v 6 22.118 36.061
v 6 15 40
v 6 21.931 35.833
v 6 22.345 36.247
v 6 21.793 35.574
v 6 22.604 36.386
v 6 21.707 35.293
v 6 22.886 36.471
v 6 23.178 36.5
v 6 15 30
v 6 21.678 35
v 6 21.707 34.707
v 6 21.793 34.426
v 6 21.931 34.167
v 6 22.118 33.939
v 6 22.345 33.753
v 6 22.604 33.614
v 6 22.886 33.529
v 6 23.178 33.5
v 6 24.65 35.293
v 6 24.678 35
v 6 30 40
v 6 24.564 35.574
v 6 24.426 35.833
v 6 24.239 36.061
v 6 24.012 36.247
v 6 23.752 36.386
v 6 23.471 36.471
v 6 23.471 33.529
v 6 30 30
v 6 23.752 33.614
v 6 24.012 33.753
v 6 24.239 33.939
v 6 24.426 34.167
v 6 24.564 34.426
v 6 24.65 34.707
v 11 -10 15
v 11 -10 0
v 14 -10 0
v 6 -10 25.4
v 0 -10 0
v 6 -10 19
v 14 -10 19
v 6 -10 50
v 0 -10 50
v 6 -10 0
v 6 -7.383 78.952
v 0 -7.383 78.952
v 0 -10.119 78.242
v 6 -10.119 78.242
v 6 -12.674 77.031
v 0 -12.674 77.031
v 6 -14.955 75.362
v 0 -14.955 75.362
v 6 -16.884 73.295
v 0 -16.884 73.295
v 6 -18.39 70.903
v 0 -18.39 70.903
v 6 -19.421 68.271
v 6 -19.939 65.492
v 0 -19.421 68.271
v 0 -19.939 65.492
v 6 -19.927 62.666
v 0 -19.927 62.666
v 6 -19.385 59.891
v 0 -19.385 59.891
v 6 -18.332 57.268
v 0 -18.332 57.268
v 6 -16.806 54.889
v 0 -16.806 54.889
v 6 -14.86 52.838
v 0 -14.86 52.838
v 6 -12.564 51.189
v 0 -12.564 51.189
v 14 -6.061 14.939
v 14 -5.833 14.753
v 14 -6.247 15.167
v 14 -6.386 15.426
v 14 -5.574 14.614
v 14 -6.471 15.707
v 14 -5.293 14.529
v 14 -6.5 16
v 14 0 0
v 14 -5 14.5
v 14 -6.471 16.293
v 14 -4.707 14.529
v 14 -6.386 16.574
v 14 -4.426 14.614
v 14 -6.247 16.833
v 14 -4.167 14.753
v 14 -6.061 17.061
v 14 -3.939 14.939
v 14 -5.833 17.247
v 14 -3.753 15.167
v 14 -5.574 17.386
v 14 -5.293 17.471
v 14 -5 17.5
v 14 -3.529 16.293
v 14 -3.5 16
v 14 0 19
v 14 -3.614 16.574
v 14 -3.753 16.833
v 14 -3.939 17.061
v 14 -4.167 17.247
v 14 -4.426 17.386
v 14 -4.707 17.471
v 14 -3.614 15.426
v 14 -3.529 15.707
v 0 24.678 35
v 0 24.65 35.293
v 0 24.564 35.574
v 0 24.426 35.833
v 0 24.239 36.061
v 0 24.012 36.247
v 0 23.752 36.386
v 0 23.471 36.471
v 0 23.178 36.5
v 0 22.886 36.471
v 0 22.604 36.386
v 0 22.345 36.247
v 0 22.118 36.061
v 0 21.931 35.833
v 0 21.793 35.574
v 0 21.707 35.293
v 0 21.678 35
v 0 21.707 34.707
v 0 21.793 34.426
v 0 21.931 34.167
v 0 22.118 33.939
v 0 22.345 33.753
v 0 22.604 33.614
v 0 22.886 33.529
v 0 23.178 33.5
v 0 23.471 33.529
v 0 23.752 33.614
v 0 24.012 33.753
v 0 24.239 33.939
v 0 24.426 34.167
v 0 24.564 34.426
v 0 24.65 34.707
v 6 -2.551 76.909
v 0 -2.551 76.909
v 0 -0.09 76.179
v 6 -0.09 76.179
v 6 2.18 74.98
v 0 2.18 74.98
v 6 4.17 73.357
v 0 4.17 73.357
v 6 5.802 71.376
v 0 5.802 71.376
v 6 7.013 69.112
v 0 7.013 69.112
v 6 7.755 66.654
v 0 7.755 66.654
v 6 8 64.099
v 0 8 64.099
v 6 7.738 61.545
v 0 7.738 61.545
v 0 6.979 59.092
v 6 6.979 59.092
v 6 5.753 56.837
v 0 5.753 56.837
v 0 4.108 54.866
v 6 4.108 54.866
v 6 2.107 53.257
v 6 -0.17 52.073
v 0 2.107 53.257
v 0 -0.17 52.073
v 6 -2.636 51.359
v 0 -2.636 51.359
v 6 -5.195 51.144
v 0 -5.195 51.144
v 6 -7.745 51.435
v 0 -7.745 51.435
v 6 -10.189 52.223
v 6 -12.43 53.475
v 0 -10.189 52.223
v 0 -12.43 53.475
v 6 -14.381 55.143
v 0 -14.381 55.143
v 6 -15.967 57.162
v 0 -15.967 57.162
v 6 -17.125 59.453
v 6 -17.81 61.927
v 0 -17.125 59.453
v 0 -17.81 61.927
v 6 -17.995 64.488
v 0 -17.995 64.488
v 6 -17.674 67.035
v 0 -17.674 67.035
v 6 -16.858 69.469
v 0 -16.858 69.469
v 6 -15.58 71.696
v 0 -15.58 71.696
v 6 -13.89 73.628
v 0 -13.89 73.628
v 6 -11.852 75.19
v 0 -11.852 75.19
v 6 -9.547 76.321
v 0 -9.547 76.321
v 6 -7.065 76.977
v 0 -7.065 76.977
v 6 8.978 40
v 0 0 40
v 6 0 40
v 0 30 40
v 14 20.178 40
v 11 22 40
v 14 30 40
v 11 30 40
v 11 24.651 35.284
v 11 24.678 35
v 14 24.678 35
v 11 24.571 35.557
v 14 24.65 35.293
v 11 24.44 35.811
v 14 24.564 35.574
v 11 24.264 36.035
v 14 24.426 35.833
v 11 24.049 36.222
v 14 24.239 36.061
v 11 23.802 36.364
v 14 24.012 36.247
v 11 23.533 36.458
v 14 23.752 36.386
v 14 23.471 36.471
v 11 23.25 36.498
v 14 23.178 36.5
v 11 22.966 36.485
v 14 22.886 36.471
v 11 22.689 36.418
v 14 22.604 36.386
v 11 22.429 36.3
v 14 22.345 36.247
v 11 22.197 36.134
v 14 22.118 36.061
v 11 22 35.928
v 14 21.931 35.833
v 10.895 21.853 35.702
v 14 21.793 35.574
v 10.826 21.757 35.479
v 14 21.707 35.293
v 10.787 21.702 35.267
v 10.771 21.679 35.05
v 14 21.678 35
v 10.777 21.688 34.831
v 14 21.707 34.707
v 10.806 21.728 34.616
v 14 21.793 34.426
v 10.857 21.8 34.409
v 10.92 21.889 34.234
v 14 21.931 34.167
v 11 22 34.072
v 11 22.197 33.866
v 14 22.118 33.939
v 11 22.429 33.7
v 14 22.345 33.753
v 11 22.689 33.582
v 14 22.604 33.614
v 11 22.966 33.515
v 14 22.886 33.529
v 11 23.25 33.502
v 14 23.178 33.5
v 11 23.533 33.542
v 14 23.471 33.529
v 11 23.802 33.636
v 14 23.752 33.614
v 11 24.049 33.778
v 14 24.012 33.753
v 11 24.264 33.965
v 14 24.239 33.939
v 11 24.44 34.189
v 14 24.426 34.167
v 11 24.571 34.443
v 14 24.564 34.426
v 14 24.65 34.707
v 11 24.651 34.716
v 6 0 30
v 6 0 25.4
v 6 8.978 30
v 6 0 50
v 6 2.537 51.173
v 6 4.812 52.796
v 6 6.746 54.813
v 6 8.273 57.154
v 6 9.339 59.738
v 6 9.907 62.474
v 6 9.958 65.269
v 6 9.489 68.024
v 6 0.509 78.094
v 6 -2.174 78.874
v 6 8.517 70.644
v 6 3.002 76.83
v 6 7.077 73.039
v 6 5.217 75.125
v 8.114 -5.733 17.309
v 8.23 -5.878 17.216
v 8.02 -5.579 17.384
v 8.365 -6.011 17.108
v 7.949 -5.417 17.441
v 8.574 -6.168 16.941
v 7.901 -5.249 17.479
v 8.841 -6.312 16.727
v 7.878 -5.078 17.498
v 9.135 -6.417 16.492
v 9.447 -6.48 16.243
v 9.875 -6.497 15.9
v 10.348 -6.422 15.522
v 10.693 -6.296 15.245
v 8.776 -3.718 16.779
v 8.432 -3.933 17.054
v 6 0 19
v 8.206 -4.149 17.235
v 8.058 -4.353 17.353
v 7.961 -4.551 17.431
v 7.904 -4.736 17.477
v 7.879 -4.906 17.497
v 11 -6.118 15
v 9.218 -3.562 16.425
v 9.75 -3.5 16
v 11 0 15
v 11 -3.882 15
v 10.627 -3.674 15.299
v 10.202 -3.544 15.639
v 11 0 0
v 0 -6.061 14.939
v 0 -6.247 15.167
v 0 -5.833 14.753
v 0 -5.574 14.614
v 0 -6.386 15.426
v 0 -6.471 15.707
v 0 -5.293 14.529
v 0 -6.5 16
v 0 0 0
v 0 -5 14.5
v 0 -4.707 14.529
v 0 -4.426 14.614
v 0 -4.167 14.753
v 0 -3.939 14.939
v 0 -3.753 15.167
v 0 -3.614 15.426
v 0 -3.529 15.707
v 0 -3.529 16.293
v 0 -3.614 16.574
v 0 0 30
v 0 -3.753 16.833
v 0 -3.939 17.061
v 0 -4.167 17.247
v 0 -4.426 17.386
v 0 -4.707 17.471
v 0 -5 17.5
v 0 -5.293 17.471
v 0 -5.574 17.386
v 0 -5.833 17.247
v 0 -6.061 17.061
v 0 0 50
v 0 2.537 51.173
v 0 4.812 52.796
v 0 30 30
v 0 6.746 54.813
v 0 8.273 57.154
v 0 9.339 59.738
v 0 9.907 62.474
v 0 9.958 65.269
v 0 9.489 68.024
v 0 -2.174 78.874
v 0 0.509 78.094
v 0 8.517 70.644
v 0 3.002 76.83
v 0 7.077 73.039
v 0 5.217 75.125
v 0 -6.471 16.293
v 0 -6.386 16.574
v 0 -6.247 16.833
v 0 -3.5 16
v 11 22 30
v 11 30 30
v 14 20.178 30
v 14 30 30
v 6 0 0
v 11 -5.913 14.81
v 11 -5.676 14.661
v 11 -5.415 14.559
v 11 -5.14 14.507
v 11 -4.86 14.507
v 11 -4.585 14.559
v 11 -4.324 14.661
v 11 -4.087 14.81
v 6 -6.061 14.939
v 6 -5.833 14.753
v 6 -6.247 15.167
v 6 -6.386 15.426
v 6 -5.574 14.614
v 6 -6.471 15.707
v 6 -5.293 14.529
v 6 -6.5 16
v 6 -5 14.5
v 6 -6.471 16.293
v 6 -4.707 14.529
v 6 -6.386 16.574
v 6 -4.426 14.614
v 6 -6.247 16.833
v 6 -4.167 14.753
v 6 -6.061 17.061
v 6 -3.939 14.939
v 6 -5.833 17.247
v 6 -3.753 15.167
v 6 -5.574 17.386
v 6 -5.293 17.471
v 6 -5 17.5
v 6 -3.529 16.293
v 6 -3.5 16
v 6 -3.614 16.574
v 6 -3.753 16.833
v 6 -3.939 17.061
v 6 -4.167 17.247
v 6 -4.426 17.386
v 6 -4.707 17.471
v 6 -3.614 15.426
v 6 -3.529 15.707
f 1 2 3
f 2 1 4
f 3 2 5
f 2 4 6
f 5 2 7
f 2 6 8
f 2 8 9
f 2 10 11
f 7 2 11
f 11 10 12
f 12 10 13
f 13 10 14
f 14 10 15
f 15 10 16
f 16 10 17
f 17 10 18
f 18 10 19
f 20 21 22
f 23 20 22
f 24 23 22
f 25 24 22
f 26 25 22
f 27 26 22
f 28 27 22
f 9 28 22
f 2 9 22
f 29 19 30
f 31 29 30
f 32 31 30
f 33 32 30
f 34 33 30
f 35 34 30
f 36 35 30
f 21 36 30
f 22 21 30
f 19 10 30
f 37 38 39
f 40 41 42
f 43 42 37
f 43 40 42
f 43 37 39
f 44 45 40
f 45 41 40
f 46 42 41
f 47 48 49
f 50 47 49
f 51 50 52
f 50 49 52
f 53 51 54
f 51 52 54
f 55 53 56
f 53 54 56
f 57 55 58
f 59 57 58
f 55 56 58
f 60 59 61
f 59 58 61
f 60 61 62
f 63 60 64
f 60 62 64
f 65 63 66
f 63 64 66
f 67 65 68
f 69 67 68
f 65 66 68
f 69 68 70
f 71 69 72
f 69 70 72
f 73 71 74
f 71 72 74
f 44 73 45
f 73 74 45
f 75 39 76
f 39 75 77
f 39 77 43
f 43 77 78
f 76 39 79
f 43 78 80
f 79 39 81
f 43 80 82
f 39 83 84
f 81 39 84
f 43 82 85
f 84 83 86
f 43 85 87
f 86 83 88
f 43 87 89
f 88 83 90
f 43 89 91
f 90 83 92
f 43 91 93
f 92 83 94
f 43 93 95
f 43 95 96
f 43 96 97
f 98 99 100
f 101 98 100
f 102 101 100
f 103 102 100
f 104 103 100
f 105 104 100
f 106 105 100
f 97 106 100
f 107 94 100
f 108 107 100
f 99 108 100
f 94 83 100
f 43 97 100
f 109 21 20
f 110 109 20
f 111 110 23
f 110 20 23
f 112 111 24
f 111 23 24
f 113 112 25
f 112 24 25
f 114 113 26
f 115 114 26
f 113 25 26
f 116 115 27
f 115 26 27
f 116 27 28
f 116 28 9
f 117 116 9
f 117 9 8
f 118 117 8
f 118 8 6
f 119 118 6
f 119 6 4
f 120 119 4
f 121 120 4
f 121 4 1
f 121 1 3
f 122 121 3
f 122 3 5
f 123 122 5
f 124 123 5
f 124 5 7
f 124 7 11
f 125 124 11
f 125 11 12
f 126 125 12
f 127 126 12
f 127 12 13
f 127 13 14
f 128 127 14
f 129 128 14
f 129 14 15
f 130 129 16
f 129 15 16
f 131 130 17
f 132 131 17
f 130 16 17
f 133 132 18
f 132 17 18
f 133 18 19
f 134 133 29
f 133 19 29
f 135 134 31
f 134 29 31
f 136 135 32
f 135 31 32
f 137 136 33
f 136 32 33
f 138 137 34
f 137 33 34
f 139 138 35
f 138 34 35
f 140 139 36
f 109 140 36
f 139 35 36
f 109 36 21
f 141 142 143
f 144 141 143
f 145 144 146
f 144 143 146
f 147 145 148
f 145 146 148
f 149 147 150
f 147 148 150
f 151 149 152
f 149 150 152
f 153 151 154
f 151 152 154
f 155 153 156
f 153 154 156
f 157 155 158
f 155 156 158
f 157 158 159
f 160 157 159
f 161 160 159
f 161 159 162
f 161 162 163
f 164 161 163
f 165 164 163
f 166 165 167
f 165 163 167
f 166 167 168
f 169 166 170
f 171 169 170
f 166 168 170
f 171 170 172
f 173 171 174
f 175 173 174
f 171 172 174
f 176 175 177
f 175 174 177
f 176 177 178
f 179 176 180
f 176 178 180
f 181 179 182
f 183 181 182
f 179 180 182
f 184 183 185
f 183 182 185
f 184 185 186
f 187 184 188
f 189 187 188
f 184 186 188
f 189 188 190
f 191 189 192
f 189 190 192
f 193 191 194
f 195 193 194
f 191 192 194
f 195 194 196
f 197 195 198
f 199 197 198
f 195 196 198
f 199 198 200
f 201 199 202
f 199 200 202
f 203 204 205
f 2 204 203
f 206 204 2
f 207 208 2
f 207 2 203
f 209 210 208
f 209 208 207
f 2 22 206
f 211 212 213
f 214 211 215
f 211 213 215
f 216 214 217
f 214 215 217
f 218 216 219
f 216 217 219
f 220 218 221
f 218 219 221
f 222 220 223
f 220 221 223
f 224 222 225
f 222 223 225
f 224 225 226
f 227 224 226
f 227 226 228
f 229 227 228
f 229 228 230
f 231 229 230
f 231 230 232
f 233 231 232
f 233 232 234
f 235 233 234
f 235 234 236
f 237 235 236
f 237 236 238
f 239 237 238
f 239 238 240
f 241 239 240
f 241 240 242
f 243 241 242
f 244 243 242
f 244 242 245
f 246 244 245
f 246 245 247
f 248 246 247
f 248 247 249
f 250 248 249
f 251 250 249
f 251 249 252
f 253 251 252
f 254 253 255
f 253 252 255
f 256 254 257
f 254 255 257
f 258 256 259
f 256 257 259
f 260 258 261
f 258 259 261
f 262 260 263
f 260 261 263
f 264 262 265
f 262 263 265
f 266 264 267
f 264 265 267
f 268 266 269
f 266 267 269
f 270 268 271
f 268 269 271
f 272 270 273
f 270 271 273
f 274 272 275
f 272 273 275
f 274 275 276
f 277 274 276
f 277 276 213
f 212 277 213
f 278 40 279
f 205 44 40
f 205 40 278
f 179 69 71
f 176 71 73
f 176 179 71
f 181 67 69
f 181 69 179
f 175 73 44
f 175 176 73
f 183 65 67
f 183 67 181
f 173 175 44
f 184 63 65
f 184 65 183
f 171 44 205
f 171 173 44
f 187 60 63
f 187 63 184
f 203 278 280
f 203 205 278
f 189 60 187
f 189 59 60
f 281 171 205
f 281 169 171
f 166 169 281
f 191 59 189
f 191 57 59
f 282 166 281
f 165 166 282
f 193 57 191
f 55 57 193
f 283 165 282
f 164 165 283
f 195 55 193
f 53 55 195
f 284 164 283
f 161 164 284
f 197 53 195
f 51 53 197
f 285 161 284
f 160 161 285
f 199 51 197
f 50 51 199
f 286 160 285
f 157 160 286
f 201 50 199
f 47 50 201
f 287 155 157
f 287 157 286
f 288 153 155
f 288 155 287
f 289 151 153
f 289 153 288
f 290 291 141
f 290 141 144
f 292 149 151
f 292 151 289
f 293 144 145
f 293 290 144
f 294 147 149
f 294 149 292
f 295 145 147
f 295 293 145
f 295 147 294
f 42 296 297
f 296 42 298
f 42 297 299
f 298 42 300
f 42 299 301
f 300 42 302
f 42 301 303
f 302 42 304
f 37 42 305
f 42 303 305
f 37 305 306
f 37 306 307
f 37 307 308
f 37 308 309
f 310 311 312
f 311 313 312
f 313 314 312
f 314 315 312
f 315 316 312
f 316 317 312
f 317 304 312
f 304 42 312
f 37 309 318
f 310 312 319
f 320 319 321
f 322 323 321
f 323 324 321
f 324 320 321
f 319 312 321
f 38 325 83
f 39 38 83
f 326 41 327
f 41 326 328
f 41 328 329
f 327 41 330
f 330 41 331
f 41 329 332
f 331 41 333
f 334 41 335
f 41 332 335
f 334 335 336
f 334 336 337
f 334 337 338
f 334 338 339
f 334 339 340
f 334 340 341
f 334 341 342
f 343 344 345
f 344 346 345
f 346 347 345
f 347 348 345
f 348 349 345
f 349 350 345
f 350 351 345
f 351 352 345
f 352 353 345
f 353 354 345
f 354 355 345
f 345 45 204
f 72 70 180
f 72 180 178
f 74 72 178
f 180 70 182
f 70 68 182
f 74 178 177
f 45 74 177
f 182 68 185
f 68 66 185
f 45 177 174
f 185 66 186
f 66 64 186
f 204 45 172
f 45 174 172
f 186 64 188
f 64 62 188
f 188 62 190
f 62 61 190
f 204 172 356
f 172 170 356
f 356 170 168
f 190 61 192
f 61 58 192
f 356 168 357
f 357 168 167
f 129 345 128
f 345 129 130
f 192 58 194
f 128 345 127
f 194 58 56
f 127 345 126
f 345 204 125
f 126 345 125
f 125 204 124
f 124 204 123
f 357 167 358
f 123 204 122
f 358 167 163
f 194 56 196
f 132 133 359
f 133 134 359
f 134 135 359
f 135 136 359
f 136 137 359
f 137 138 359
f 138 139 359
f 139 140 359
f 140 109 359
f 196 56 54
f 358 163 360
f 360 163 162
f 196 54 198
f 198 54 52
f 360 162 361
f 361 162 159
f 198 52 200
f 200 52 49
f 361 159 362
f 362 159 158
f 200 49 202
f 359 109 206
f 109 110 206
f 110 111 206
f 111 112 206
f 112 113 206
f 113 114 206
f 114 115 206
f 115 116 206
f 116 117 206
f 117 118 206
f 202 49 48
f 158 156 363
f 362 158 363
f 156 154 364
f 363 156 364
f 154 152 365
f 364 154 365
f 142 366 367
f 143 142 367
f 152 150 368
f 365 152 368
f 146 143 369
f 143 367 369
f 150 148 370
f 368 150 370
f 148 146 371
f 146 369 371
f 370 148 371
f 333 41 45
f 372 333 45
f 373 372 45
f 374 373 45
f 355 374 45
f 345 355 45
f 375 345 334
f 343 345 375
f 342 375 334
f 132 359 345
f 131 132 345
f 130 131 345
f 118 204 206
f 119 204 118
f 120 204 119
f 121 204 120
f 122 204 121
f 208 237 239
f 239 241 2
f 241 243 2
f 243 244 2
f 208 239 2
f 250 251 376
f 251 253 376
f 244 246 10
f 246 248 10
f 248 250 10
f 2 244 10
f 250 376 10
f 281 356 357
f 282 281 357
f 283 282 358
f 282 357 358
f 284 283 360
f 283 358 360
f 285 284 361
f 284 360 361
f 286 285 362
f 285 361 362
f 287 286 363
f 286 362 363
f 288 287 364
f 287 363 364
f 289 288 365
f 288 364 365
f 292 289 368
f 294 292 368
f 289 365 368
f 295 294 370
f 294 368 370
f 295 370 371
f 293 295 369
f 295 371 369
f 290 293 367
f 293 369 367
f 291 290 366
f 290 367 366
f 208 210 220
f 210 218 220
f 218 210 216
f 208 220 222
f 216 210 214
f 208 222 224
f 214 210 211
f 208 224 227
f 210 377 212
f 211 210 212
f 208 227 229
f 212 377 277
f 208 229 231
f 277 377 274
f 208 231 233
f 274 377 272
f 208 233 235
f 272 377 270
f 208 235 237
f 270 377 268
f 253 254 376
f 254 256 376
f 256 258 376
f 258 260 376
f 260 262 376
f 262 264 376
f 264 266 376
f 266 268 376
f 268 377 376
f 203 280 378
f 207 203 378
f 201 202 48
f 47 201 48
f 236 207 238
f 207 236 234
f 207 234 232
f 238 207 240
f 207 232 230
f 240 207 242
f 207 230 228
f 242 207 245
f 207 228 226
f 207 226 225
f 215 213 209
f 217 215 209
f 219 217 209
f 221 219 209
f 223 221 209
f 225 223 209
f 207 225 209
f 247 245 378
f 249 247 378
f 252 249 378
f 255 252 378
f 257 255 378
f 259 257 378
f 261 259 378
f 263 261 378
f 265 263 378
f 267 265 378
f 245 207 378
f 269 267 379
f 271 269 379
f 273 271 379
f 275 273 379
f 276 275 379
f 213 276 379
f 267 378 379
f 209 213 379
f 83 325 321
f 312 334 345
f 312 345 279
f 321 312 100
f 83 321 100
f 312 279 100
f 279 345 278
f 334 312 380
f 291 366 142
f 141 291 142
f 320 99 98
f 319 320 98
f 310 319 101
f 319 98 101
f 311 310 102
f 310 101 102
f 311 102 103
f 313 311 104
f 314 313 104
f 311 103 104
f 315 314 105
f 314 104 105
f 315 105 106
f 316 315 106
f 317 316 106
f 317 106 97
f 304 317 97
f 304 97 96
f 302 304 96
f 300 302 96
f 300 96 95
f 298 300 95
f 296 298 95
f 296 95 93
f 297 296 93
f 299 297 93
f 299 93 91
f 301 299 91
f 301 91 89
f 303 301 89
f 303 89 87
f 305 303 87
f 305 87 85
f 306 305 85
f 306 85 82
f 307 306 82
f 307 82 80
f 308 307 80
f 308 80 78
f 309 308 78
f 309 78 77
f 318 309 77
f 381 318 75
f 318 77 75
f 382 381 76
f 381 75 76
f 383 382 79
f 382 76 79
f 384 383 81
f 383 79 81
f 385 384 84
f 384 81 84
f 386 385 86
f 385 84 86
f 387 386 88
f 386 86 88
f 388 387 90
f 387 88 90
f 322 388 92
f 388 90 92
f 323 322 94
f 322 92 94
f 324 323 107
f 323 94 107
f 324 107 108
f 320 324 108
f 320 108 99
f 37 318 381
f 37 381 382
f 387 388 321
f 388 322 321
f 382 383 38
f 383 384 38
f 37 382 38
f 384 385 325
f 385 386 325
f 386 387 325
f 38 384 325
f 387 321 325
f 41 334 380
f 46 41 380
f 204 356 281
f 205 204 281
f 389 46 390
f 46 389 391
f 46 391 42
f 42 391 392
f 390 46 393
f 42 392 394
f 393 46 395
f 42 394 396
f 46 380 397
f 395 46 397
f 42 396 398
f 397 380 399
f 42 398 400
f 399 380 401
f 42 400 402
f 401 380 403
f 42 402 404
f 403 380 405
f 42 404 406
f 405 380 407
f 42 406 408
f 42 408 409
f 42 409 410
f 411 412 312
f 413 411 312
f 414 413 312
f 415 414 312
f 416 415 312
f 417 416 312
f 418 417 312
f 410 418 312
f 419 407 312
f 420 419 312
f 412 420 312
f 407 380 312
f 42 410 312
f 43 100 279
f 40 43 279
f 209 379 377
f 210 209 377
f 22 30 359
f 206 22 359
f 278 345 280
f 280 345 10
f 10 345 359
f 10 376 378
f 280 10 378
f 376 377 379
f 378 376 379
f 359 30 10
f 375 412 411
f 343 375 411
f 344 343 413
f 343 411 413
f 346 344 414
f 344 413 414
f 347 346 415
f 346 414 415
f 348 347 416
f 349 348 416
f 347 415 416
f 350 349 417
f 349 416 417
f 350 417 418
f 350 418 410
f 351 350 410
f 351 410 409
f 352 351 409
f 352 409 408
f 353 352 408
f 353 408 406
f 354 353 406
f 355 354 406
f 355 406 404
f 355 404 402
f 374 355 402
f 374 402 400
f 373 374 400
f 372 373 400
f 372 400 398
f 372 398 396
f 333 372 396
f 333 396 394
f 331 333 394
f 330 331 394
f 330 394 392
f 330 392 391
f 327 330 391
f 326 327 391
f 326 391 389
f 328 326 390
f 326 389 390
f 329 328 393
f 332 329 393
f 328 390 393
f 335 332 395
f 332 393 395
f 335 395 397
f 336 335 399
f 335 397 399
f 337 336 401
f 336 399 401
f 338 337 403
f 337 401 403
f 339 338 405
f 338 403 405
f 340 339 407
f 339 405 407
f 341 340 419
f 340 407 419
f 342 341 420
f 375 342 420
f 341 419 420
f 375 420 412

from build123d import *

# Parameters (mm, degrees)
F1_DEPTH  = 10
F2_R      = 1.5
F3_DEPTH  = 25
F6_DEPTH  = 10
F7_R      = 1.5
F8_DEPTH  = 25
F10_DEPTH = 6


with BuildPart() as f1:
    # F0 (on Front) → F1 (new body)
    with BuildSketch(Plane.XZ):
        Polygon((0, 50), (0, 0), (6, 0), (6, 19), (11, 15), (11, 0), (14, 0), (14, 19), (6, 25.4), (6, 50), align=None)
    extrude(amount=F1_DEPTH)

    # F2 (on face) → F3 (cut)
    with BuildSketch(Plane.YZ.offset(14)):
        with Locations((-5, 16)):
            Circle(F2_R)
    extrude(amount=-F3_DEPTH, mode=Mode.SUBTRACT)

    # F5 (on offset) → F6 (join)
    with BuildSketch(Plane.XY.offset(30)):
        Polygon((0, 0), (6, 0), (6, 8.978372), (14, 20.178372), (14, 30), (11, 30), (11, 22), (6, 15), (6, 30), (0, 30), align=None)
    extrude(amount=F6_DEPTH)

    # F7 (on face) → F8 (cut)
    with BuildSketch(Plane.YZ.offset(14)):
        with Locations((23.178372, 35)):
            Circle(F7_R)
    extrude(amount=-F8_DEPTH, mode=Mode.SUBTRACT)

    # F9 (on Right) → F10 (join)
    with BuildSketch(Plane.YZ):
        with BuildLine():
            Line((-7.065495, 76.976999), (-7.383263, 78.951594))
            ThreePointArc((-7.383263, 78.951594), (-5.224579, 49.143817), (-2.174402, 78.873598))
            Line((-2.174402, 78.873598), (-2.551148, 76.909403))
            ThreePointArc((-2.551148, 76.909403), (-5.194635, 51.143593), (-7.065495, 76.976999))
        make_face()
    extrude(amount=F10_DEPTH)


solid = f1.part
